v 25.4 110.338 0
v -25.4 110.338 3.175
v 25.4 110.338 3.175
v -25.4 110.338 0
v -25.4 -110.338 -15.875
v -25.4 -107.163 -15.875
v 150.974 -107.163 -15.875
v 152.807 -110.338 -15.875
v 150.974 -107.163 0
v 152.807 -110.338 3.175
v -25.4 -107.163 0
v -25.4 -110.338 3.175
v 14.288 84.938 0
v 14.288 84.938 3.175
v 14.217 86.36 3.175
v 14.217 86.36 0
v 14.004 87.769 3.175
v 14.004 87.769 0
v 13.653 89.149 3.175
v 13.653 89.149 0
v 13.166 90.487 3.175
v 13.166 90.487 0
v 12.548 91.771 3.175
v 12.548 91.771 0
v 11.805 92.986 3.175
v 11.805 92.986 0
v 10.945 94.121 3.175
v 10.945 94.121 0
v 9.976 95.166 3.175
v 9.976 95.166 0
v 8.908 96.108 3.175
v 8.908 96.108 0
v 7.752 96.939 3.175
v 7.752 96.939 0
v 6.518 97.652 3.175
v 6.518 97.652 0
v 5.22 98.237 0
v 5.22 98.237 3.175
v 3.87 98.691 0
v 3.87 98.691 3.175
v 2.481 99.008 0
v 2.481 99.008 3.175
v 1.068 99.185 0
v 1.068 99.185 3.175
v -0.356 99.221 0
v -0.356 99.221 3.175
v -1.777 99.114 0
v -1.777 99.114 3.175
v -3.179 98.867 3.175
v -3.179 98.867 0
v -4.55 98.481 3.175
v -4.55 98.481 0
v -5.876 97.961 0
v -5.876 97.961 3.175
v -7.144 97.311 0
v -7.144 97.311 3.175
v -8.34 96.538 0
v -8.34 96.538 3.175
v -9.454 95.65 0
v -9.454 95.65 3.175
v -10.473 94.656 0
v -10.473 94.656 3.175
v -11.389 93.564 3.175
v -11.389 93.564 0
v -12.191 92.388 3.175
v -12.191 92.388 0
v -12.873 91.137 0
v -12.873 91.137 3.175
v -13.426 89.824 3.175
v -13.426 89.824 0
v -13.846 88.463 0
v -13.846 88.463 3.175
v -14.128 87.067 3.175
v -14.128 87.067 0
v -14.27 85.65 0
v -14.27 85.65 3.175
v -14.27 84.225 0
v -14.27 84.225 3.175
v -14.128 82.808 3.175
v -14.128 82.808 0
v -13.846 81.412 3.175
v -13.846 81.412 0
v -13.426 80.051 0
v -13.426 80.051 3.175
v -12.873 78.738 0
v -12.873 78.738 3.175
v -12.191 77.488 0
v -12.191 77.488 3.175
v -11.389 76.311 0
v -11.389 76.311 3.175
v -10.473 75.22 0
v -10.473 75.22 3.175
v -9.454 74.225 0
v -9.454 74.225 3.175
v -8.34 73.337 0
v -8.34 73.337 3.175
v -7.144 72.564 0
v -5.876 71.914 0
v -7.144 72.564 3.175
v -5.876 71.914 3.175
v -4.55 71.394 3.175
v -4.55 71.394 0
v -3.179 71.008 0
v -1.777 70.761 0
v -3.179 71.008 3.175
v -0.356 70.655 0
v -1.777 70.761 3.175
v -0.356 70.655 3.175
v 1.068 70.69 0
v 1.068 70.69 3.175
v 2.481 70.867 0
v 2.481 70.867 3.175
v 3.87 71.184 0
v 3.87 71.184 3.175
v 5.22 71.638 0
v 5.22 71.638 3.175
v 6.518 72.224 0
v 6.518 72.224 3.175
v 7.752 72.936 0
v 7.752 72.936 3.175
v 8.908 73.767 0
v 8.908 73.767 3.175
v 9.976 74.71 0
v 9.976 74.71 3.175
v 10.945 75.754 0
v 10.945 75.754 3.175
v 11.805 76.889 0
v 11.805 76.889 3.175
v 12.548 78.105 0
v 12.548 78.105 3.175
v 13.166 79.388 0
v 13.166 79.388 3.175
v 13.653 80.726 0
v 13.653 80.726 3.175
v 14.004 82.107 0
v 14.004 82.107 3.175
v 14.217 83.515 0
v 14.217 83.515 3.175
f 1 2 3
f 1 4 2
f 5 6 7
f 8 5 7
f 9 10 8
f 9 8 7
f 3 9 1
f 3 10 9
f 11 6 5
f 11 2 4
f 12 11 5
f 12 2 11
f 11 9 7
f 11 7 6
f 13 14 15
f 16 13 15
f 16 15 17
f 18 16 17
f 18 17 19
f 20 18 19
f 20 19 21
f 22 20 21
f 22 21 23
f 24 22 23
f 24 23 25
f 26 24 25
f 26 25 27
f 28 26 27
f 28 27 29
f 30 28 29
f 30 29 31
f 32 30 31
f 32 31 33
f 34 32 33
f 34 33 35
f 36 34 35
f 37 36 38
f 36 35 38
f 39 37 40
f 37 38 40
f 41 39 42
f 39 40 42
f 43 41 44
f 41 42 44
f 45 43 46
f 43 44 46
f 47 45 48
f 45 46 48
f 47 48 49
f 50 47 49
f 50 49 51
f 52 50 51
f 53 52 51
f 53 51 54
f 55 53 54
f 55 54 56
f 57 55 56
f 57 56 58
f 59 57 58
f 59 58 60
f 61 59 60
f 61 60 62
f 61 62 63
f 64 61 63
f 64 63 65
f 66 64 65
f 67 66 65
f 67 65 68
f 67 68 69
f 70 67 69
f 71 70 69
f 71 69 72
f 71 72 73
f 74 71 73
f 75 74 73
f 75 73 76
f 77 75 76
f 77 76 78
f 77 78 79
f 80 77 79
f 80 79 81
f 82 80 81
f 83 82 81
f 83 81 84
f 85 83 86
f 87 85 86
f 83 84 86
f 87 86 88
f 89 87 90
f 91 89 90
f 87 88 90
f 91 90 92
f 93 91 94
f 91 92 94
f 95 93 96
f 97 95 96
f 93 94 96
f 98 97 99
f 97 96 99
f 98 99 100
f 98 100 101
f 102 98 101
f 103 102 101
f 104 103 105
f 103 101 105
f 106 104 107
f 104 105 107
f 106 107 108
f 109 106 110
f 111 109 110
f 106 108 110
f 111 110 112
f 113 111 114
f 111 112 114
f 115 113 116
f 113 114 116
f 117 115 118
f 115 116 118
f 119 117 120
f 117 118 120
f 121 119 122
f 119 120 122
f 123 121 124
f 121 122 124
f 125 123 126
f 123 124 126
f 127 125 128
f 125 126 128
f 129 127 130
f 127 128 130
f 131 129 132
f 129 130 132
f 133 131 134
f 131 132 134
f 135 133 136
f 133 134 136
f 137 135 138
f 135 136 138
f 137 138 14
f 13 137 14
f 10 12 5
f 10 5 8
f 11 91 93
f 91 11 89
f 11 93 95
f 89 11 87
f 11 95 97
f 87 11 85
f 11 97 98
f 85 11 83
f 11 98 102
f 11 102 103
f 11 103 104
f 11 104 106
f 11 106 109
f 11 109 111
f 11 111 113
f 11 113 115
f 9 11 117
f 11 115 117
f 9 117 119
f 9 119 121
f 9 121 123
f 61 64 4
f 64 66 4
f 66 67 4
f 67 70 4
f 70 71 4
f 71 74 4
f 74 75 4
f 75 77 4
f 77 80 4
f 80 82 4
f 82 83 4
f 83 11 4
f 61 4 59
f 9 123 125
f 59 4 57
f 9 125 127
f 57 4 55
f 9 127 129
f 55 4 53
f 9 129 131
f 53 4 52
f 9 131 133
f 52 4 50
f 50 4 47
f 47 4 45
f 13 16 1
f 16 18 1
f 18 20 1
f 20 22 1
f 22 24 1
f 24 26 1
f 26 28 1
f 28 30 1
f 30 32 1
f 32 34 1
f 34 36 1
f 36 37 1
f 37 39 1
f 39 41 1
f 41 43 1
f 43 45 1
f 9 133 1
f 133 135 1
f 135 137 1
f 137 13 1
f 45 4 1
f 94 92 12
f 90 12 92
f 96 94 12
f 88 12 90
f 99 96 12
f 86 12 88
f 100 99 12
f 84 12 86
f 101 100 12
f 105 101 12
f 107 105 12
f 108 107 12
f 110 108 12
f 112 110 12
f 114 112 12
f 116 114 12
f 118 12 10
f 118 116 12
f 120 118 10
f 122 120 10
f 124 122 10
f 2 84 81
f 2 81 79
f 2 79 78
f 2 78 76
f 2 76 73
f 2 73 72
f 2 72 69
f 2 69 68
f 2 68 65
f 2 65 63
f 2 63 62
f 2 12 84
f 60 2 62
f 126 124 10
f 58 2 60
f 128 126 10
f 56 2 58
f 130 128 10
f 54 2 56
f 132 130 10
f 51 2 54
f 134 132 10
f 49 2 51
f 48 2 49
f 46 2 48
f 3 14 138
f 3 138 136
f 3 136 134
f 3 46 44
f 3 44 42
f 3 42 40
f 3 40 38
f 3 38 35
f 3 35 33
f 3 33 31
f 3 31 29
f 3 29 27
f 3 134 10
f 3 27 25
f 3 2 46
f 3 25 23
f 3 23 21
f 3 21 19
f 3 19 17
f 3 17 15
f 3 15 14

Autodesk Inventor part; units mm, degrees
ref_plane "YZ Plane" through (0, 0, 0) normal (1, 0, 0) x (0, 1, 0)
ref_plane "XZ Plane" through (0, 0, 0) normal (0, 1, 0) x (-1, 0, 0)
ref_plane "XY Plane" through (0, 0, 0) normal (0, 0, 1) x (1, 0, 0)
sketch "Sketch1" plane through (0, 0, 0) normal (0, 0, 1) x (1, 0, 0)
  line L0 (25.4, -110.3376) -> (-25.4, -110.3376)
  line L1 (-25.4, -110.3376) -> (-25.4, 110.3376)
  line L2 (-25.4, 110.3376) -> (25.4, 110.3376)
  line L3 (25.4, 110.3376) -> (25.4, -110.3376)
  line L4 (25.4, -110.3376) -> (-25.4, 110.3376) construction
  line L5 (-25.4, -110.3376) -> (25.4, 110.3376) construction
  line L6 (25.4, 110.3376) -> (152.8069, -110.3376)
  line L7 (25.4, 110.3376) -> (280.2138, 110.3376) construction
  line L8 (152.8069, -110.3376) -> (25.4, -110.3376)
  point P0 (0, 0)
  dimension "d0" = 50.8
  dimension "d1" = 220.6752
  dimension "d2" = 60
extrude "Extrusion1" add sketch "Sketch1" along normal blind 3.175
sketch "Sketch2" plane through (0, 0, 3.175) normal (0, 0, 1) x (1, 0, 0)
  line L0 (152.8069, -110.3376) -> (25.4, 110.3376) projected
  line L1 (-25.4, -110.3376) -> (152.8069, -110.3376)
  line L2 (152.8069, -107.1626) -> (-25.4, -107.1626)
  line L3 (-25.4, -107.1626) -> (-25.4, -110.3376)
  line L4 (150.9738, -107.1626) -> (152.8069, -110.3376)
  point P0 (0, 0)
  dimension "d5" = 3.175
extrude "Extrusion2" add sketch "Sketch2" against normal blind 19.05
sketch "Sketch3" plane through (0, 0, 3.175) normal (0, 0, 1) x (1, 0, 0)
  line L0 (-25.4, 110.3376) -> (0, 110.3376)
  line L1 (0, 110.3376) -> (0, 84.9376)
  line L2 (0, 84.9376) -> (-25.4, 84.9376)
  line L3 (-25.4, 84.9376) -> (-25.4, 110.3376)
  circle A0 centre (0, 84.9376) radius 14.2875
  point P0 (0, 0)
  dimension "d8" = 25.4
  dimension "d9" = 25.4
  dimension "d10" = 28.575
extrude "Extrusion3" cut sketch "Sketch3" against normal blind 25.4 contours A0 L2 L1 | L1 L2 A0
properties part number "RPlate"
